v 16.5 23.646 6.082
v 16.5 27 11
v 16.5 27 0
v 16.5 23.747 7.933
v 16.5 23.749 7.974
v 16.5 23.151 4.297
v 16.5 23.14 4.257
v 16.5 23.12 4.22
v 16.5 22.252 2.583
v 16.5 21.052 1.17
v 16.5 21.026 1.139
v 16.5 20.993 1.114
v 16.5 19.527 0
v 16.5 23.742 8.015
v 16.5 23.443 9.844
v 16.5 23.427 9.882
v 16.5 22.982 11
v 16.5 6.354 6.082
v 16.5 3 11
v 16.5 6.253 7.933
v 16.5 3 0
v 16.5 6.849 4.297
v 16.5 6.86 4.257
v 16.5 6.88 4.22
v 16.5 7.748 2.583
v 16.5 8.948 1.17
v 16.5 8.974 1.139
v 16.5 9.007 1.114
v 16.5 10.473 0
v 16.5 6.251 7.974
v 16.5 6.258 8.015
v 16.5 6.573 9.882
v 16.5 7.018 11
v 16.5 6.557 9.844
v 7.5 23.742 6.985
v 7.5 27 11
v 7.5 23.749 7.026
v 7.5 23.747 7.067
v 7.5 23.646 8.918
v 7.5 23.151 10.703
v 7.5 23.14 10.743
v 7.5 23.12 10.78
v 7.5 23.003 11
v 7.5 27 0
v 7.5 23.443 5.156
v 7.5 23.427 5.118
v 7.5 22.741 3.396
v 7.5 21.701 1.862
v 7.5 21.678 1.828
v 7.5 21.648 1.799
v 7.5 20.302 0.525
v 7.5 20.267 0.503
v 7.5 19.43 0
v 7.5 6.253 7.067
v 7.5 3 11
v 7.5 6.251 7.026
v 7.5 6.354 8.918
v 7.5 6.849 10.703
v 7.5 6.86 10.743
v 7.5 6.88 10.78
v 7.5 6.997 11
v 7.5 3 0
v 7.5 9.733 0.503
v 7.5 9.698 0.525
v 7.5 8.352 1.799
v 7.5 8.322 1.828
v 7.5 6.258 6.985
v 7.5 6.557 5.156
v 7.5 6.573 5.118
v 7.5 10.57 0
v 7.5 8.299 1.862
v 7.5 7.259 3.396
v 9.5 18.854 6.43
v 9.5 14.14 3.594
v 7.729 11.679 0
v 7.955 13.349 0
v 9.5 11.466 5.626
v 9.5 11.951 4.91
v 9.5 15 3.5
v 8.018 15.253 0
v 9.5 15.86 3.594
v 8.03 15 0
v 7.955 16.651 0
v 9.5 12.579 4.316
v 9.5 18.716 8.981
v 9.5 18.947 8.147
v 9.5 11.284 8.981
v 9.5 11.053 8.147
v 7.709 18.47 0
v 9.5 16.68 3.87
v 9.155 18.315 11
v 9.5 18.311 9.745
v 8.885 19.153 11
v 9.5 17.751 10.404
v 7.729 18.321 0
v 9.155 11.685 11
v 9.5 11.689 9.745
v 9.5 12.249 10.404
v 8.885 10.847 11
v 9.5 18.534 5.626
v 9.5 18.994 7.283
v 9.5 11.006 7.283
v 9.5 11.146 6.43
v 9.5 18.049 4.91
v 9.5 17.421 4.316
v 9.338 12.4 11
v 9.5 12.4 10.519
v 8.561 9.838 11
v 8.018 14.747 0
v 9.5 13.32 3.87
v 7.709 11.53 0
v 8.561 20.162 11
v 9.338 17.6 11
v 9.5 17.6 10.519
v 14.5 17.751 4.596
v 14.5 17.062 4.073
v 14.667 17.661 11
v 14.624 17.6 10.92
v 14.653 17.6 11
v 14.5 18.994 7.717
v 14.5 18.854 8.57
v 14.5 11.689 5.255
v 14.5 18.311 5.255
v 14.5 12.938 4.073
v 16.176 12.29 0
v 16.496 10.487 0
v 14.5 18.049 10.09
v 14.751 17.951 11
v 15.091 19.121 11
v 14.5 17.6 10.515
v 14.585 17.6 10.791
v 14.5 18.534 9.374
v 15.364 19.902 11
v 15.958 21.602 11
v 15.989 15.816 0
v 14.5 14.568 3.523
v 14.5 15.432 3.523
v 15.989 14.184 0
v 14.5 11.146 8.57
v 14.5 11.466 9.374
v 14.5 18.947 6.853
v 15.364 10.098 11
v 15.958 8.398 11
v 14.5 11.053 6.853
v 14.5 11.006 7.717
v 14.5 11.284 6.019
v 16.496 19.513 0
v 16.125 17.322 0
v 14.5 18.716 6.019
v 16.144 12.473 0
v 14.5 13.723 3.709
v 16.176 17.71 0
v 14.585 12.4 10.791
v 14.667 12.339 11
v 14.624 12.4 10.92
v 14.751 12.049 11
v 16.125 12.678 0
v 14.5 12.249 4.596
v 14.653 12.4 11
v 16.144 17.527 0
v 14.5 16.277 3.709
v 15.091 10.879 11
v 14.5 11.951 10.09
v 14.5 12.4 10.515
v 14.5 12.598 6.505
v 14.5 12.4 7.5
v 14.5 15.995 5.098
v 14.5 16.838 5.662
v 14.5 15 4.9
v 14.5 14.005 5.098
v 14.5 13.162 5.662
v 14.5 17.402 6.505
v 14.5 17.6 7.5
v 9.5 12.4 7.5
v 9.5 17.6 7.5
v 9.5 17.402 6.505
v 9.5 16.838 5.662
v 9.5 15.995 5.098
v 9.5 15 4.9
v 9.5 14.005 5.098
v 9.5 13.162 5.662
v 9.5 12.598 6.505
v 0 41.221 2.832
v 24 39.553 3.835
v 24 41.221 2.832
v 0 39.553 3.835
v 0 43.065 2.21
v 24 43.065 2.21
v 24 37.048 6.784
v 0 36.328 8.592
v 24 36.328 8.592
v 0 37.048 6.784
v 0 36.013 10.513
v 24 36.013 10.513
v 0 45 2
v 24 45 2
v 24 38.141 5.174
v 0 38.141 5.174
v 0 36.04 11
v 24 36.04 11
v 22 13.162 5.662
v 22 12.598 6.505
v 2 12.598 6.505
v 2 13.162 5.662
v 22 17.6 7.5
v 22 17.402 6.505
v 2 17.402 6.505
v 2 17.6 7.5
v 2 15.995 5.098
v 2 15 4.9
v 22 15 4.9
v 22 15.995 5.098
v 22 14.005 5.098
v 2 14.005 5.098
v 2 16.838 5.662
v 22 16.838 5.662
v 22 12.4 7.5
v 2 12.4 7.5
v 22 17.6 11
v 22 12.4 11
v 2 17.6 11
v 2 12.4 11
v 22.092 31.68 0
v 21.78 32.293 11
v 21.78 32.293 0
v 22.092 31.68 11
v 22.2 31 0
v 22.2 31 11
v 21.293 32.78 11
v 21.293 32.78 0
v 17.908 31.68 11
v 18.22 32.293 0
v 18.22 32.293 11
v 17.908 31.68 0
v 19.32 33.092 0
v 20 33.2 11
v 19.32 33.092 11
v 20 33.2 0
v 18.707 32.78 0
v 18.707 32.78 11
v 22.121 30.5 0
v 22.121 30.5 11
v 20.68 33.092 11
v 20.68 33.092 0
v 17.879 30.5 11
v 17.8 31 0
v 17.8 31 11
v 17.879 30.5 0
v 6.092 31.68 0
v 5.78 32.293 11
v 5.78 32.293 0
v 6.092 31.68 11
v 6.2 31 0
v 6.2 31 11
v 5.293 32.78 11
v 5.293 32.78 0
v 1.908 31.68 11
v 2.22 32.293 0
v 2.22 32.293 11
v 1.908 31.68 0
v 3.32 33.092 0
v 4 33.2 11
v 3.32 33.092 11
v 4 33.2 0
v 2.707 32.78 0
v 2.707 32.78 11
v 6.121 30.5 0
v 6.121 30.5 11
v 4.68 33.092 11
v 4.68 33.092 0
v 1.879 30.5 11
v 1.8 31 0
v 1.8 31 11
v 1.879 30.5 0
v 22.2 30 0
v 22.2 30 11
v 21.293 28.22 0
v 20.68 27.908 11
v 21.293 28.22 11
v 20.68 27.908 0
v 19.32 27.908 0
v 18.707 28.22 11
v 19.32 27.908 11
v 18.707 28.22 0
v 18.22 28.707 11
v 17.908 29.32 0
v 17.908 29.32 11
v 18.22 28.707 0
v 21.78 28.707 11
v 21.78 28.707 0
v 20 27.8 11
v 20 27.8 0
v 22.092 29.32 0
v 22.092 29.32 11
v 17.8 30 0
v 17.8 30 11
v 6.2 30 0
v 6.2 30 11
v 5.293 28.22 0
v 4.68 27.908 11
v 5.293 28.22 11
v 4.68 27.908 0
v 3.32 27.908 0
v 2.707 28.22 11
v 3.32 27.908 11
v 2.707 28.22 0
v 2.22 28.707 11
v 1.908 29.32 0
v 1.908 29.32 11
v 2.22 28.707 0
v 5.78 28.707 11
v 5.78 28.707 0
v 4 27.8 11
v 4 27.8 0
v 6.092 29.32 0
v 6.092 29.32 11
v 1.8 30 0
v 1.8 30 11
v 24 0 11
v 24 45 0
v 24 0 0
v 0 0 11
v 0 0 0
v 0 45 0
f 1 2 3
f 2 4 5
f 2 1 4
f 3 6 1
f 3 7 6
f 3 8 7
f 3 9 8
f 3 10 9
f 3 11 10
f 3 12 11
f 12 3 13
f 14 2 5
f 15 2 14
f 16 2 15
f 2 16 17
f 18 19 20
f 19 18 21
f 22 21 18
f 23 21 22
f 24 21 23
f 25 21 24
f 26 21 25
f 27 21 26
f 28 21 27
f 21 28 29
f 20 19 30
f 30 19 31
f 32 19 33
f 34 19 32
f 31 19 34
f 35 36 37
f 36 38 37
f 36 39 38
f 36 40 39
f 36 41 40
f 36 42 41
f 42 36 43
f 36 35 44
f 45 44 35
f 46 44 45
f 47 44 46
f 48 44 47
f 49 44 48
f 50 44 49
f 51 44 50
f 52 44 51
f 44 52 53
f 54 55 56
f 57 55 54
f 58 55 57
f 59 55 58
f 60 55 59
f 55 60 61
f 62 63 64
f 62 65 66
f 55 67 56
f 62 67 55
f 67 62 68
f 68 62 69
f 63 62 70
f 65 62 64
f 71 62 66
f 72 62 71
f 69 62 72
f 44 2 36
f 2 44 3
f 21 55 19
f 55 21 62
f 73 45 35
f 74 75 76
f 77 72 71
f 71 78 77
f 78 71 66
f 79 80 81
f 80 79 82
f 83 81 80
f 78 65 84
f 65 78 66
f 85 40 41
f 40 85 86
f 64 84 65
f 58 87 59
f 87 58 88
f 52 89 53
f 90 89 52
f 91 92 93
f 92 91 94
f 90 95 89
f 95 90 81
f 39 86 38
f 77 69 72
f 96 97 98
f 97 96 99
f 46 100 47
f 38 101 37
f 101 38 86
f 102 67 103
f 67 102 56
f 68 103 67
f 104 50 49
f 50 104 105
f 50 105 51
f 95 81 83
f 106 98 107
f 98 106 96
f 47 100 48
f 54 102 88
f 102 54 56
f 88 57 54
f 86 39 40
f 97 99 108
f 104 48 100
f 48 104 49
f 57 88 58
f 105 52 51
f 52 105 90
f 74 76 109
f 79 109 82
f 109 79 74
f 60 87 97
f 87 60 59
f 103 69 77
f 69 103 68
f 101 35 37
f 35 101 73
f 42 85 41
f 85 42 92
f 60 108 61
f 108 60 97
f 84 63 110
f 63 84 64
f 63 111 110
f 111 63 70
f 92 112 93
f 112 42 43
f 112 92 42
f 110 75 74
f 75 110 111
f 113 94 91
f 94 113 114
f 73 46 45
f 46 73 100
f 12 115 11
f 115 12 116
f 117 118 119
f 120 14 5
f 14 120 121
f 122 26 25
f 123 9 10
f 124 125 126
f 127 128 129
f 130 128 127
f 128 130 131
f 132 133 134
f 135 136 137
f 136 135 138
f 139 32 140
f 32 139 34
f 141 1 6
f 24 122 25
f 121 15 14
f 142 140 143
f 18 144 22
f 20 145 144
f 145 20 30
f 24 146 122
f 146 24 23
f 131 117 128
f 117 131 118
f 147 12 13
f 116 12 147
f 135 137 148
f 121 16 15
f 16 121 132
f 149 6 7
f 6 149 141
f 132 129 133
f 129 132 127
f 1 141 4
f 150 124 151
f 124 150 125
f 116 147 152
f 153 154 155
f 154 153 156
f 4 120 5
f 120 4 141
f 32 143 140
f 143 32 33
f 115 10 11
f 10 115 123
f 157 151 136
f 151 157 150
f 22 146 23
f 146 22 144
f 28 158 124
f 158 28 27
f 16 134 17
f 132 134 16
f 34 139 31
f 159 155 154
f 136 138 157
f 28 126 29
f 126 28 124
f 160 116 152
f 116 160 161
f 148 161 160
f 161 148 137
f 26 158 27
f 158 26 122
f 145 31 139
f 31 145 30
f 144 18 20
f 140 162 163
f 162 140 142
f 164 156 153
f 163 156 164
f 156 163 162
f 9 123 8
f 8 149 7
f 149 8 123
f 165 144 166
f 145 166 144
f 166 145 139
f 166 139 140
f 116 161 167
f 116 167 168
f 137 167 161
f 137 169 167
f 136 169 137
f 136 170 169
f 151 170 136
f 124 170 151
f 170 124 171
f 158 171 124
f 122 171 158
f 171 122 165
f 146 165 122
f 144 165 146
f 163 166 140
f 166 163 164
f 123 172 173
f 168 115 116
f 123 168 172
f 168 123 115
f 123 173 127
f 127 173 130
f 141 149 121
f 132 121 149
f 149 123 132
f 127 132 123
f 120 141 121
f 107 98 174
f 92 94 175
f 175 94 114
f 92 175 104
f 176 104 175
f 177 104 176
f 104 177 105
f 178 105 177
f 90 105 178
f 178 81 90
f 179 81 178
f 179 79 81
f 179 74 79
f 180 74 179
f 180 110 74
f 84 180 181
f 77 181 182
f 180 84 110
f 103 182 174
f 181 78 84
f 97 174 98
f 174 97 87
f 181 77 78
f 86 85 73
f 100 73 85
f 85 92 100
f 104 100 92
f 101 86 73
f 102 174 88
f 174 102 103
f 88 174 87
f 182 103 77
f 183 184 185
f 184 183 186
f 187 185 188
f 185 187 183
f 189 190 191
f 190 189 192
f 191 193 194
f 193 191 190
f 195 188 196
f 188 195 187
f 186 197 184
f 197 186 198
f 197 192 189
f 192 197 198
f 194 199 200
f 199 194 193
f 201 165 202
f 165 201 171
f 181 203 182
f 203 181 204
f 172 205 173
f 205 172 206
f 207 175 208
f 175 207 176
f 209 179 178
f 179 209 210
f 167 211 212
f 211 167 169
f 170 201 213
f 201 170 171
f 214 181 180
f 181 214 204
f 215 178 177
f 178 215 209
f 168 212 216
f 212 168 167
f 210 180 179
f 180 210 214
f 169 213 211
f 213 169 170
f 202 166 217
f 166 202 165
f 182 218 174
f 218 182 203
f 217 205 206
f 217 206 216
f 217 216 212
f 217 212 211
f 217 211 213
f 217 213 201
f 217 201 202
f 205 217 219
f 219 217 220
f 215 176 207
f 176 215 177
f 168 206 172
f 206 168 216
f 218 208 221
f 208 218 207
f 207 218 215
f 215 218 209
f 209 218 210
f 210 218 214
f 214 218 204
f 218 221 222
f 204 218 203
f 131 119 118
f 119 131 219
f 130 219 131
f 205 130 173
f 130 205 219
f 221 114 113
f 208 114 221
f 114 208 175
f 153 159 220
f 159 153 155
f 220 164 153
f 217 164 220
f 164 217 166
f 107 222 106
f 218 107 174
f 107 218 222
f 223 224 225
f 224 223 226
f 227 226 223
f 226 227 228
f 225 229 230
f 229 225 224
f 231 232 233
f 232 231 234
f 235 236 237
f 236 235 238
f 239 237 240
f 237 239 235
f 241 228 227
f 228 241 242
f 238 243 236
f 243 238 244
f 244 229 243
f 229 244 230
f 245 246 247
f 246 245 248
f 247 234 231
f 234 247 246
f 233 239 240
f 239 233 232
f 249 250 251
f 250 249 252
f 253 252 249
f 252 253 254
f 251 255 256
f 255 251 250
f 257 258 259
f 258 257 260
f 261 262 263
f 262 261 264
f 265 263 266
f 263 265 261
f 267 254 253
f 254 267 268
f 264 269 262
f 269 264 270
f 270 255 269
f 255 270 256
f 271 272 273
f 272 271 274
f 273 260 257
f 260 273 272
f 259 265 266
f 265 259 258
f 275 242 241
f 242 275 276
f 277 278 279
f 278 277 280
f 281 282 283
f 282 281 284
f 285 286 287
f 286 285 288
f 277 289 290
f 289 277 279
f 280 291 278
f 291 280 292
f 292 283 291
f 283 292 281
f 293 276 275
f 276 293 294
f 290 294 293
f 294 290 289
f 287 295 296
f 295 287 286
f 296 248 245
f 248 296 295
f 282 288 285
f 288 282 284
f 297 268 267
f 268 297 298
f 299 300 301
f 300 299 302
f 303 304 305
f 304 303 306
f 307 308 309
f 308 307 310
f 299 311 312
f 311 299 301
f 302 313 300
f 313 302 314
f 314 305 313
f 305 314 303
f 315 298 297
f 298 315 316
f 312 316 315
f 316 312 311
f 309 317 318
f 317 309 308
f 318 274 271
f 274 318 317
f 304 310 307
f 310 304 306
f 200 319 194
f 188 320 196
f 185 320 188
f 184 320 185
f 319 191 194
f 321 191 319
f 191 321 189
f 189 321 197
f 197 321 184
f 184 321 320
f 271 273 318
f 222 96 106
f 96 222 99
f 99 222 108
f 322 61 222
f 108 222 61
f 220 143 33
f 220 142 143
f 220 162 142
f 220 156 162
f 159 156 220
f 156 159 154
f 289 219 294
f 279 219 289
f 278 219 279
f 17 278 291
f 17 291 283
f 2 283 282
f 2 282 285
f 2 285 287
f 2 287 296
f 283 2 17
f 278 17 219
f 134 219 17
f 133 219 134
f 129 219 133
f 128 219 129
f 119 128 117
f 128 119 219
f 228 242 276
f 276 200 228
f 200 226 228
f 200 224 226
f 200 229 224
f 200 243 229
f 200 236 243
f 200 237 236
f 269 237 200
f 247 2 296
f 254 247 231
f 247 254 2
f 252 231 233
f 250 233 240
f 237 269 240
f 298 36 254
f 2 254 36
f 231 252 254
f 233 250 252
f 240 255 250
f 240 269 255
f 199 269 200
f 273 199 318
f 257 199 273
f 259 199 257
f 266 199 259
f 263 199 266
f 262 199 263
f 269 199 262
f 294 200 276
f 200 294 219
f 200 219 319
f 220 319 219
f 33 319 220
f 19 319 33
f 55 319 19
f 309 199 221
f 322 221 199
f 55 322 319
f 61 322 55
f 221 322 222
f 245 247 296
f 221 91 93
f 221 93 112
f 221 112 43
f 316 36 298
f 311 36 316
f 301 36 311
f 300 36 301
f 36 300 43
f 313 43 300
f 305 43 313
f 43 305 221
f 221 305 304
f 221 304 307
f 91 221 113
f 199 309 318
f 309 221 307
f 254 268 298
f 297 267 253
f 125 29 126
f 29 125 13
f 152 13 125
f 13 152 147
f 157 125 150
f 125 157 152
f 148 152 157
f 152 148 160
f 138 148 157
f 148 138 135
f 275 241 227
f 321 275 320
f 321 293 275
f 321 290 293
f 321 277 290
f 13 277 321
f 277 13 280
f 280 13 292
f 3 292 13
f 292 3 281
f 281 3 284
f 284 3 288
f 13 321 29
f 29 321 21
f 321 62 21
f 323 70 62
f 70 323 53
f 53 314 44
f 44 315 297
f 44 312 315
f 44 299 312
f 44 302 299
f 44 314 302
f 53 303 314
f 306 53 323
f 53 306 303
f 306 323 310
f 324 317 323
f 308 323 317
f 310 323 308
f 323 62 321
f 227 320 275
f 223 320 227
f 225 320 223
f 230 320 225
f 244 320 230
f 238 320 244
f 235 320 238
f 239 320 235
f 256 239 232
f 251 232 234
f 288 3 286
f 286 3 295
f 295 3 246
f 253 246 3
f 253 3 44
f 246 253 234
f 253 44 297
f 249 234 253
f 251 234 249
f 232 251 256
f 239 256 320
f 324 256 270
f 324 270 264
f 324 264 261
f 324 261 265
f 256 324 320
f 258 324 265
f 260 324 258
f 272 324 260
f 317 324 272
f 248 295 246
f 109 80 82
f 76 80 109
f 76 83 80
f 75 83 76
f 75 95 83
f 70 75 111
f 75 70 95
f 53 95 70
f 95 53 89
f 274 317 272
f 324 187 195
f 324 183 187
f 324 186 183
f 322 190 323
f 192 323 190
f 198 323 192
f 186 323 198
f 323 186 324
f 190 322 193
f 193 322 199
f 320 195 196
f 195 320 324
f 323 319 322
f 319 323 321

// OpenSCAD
// RebeliX
//
// extruder idler
// GNU GPL v3
// Martin Neruda <neruda@reprap4u.cz>
// http://www.reprap4u.cz
// Inspired by Prusa i3

bearing_diameter = 16.3;
bearing_width  = 5;
bearing_rod_diameter = 5;
bearing_offset = 3.5;

module extruder_idler_base(){
 translate([0,0,0]) cube([24,45,8+3]);
}

module extruder_idler_holes(){
 translate([12,15,0]){
  // Main cutout
  difference(){
	cube([bearing_width+4,24,25], center= true);
	translate([-(bearing_width+4)/2-0.1,0,11-bearing_offset])rotate([0,90,0])
	cylinder(r1=9,r2=4, h=2.1);
	translate([(bearing_width+4)/2+0.1,0,11-bearing_offset])rotate([0,-90,0])
	cylinder(r1=9,r2=4, h=2.1);
  }
  cube([bearing_width,24,25], center= true);
  // Vyrez pro odklopeni
  translate([-12.1,30,11]) rotate([0,90,0]) cylinder(r=9,h=25); 
  
  // Idler shaft
  translate([-10,0,11-bearing_offset])rotate([0,90,0])cylinder(r=bearing_rod_diameter/2+0.1, h=20, $fn=16);
  translate([-10,-bearing_rod_diameter/2-0.1,11-bearing_offset]) cube([20,bearing_rod_diameter+0.2,6]);
  // Screw holes
  translate([8,16,-1])cylinder(r=2.2, h=24, $fn=20);
  translate([-8,16,-1])cylinder(r=2.2, h=24, $fn=20);

  translate([8,15,-1])cylinder(r=2.2, h=24, $fn=20);
  translate([-8,15,-1])cylinder(r=2.2, h=24, $fn=20);
 }
}


// Idler final part
module idler(){
 difference(){
  extruder_idler_base();
  extruder_idler_holes();
 }
}

idler();
